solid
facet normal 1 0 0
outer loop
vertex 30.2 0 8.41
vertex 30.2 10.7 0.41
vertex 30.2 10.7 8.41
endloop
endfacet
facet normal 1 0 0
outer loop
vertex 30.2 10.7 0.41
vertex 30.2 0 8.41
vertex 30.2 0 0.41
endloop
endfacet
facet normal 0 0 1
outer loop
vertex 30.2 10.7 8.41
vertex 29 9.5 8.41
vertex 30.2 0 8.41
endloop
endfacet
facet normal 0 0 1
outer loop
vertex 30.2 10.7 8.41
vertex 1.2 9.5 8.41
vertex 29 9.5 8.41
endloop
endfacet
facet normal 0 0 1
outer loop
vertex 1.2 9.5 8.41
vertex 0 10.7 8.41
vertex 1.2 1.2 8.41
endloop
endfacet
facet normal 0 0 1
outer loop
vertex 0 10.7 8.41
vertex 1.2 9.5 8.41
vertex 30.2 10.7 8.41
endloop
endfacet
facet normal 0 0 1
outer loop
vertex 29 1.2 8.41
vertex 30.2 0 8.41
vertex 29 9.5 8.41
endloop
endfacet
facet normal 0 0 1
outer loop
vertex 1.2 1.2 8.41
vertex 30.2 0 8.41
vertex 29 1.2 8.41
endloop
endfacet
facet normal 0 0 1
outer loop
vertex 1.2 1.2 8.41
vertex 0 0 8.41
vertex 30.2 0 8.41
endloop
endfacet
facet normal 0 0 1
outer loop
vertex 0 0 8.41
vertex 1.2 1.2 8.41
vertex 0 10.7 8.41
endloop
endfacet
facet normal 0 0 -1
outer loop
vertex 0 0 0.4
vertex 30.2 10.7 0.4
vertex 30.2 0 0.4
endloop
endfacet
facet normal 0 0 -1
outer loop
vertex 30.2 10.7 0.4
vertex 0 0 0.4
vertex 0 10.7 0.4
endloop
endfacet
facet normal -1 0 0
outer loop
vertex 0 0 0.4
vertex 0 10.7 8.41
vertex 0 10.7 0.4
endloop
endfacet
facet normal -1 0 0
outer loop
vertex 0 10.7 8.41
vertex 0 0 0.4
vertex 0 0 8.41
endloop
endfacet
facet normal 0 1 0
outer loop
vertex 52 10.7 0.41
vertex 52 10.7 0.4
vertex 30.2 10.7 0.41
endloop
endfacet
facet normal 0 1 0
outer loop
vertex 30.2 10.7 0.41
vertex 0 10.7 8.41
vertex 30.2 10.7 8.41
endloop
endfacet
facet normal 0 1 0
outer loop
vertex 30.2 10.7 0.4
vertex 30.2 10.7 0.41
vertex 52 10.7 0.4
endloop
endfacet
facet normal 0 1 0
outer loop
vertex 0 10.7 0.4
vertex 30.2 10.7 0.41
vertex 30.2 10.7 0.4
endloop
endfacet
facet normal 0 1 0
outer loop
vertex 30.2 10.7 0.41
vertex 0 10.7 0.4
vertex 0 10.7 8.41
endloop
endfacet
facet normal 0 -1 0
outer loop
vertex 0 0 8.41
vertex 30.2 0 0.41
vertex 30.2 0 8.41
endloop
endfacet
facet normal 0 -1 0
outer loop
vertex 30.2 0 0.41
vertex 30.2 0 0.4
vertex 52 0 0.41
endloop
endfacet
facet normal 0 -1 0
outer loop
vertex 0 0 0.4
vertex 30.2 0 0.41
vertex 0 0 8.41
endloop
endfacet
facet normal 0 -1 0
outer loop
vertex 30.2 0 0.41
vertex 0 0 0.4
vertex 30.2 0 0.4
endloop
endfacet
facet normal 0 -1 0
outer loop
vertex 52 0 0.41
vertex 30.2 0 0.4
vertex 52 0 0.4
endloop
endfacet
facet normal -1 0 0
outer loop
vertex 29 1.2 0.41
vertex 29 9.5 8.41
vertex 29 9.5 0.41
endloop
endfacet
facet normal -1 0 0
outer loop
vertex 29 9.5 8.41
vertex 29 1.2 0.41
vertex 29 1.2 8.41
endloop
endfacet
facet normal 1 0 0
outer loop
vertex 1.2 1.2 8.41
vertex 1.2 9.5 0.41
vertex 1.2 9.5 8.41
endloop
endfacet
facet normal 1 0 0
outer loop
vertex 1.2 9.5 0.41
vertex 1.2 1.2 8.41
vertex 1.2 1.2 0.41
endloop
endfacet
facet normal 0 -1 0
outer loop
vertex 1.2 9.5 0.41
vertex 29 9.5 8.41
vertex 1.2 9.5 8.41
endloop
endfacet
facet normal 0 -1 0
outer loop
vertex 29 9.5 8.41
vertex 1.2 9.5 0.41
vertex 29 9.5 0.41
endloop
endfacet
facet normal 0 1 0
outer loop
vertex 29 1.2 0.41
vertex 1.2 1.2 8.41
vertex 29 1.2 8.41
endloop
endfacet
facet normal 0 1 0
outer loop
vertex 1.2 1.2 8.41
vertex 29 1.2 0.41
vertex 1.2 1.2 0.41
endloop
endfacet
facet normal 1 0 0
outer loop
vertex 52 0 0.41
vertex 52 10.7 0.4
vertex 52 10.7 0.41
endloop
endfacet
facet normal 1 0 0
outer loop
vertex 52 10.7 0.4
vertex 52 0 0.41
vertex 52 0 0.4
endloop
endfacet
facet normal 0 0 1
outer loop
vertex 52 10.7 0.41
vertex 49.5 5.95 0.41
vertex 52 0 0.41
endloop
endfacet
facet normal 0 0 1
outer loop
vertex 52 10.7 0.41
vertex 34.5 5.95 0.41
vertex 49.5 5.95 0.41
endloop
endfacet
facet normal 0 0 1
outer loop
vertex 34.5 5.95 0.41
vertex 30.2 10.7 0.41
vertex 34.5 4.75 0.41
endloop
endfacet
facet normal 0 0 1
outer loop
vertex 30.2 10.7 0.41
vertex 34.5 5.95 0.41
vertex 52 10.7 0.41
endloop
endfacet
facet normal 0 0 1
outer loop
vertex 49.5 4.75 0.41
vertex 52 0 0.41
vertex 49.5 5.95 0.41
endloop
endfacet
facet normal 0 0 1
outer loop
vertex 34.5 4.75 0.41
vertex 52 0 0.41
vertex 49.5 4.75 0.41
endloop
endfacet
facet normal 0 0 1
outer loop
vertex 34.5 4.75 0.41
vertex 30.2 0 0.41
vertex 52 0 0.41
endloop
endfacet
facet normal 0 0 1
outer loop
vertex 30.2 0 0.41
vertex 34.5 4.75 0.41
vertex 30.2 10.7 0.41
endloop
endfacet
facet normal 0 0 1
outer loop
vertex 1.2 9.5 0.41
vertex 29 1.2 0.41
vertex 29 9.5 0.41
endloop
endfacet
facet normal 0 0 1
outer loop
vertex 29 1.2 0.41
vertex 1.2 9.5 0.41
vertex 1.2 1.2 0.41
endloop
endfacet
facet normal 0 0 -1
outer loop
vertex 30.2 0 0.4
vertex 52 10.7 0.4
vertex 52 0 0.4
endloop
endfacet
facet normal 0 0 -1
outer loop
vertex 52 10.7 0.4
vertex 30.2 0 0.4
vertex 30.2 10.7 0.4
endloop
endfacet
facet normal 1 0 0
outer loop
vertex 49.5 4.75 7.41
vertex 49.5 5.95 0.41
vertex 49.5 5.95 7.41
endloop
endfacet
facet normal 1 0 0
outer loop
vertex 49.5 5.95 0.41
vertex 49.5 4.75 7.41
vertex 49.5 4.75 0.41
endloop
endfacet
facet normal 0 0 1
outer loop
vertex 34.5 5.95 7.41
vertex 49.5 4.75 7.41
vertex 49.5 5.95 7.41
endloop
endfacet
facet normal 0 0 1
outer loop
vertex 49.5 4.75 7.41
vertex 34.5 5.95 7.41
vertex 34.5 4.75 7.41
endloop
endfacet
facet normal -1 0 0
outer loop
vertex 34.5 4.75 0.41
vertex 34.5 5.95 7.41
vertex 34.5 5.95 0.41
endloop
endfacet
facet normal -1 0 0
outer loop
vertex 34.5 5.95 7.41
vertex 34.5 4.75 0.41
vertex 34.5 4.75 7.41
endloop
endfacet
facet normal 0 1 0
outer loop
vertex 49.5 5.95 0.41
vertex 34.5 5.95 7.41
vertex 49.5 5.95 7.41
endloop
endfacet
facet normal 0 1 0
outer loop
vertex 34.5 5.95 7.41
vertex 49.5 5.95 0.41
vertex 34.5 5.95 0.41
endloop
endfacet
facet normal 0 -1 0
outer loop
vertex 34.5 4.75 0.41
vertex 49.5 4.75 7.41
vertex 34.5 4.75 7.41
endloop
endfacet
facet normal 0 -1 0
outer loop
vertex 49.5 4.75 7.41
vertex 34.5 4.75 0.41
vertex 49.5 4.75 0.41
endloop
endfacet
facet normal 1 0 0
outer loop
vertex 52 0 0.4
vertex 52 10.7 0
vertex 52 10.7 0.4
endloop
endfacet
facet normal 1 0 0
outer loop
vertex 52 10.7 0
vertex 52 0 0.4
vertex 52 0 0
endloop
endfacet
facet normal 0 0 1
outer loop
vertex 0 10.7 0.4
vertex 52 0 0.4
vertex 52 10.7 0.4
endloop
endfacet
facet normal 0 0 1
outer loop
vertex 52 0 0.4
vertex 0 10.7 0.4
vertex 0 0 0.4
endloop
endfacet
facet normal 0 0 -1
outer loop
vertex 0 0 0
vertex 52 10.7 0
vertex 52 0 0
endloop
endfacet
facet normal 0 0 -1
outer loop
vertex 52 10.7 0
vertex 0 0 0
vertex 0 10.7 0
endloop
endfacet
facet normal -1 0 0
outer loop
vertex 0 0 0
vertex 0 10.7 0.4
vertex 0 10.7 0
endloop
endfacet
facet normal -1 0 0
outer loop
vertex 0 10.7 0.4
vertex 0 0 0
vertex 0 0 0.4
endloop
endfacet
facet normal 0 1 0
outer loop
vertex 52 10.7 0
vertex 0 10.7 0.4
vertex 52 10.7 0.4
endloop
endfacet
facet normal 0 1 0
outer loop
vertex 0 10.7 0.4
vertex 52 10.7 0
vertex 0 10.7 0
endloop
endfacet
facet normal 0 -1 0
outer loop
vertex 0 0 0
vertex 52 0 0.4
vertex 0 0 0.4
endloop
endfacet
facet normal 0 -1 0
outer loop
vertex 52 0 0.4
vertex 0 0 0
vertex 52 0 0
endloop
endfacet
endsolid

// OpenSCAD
// file: ../../Base/Rotation.scad
// Fischertechnik Box Foundation
// Geometry Helpers Rotation

include <PlacementOptions.scad>

// getRotatedSpace(space, rotation=NoRotation)
// Rotates the space dependent on the specified rotation

function getRotatedSpace(space, rotation=NoRotation) = [
    (rotation == Rotate90 || rotation == Rotate270) ? space.y : space.x,
    (rotation == Rotate90 || rotation == Rotate270) ? space.x : space.y
];

// Rotates the given space around the fixed left lower corner
// space = the space the children needs as width/depth list [width,depth]
// rotation = 0 Rotate0 degrees, 1 Rotate90 degrees, 2 Rotate180 degrees, 3 Rotate270 degrees (equivalent to -90)

module RotateFix(space, rotation=NoRotation) {
    dy = (rotation == Rotate0 || rotation == Rotate270) ? 0 :
        (rotation == Rotate90) ? space.x :
        space.y;
    dx = (rotation < Rotate180) ? 0 :
        (rotation == Rotate180) ? space.x :
        space.y;
    
    translate([dx, dy, 0])
        rotate([0, 0, rotations[rotation]])
            children();
}
// file: ../../Base/Alignment.scad
// Fischertechnik Box Foundation
// Geometry Helpers Alignment

include <PlacementOptions.scad>

// getAlignedX(elementWidth, spaceWidth, align=AlignRight, offset=0)
// Gets the aligned X offset of an element with the given
// width in the given space.
// elementWidth = The width of the element to positon
// spaceWidth = The space where the element should be aligned
// align = 0 AlignLeft, 1 AlignCenter, 2 AlignRight
// offset = an optional offset from the aligned position. When
// aligned left or centered, then positive values are in X direction.
// When aligned right then positive values are in negative X direction.

function getAlignedX(elementWidth, spaceWidth, align=AlignRight, offset=0) =
    (align == AlignLeft) ?
        offset :
        ((align == AlignCenter) ?
        (spaceWidth - elementWidth)/2 + offset :
        spaceWidth - offset - elementWidth);

// getAlignedY(elementDepth, spaceDepth, align=AlignTop, offset=0)
// Gets the aligned Y offset of an element with the given
// depth in the given space.
// elementDepth = The depth of the element to positon
// spaceDepth = The space where the element should be aligned
// align = 0 AlignBottom, 1 AlignCenter, 2 AlignTop
// offset = an optional offset from the aligned position. When
// aligned bottom or centered, then positive values are in Y direction.
// When aligned top then positive values are in negative Y direction.

function getAlignedY(elementDepth, spaceDepth, align=AlignTop, offset=0) =
    (align == AlignBottom) ?
        offset :
        ((align == AlignCenter) ?
        (spaceDepth - elementDepth)/2 + offset :
        spaceDepth - offset - elementDepth);
// file: ../../Base/Boxes.scad
// Fischertechnik Box Foundation
// Pre-designed Boxes

use <Constants.scad>

include <PlacementOptions.scad>

box190Width = 190;
box190Depth = 130;
box130Width = 130;
box130Depth = 95;

// Values are from an original ec3 box
topBottomDifference = 1.5;
outerHeight = 40;
innerHeight = 38.2;
baseThickness = outerHeight - innerHeight;
stackExcess = 5.7;
radius = 3.5;
wallThickness = 1.5;
tolerance = 0.2;
stackOffset = innerHeight - stackExcess;

boxUsageHeight = stackOffset;
boxWallThickness = wallThickness;
boxBaseThickness = baseThickness;
boxWebWidth = 3.0;

// getBoxWallThickness()
// Gets the wall thickness of a Fischertechnik Box
function getBoxWallThickness() = boxWallThickness;

// getBoxUsageHeight()
// Gets the usable height of a Fischertechnik box
function getBoxUsageHeight() = boxUsageHeight;

// getBoxInnerHeight()
// Gets the inner height of a Fischertechnik box, including the stack excess
function getBoxInnerHeight() = innerHeight;

// getBoxBaseThickness()
// Gets the thickness of the Fischertechnik box base.
function getBoxBaseThickness() = boxBaseThickness;

// getBoxWebWidth()
// Gets the width of a box web
function getBoxWebWidth() = boxWebWidth;

// getBox190Space()
// Gets the usable inner space of a Box 190 as an x/y-list
function getBox190Space() = [
    box190Width - 2*getBoxWallThickness() - topBottomDifference, 
    box190Depth - 2*getBoxWallThickness() - topBottomDifference ];

// BoxBase(width, depth)
// Creates an empty stackable Fischertechnik compatible box
// width = Outer width of the box (190, 130, ...)
// depth = Outer depth of the box (130, 95, ...)

module BoxBase(width, depth, height=outerHeight) {    
    thinPlate = 0.01;

    innerHeight = height - baseThickness;    
    
    module BodyPlate(width, depth) {
        translate([radius, radius])
        hull() {
            w = width-2*radius;
            d = depth-2*radius;
            cube([w, d, thinPlate]);
            cylinder(thinPlate, r=radius, $fn=getFragments());
            translate([w, 0])
                cylinder(thinPlate, r=radius, $fn=getFragments());
            translate([w, d])
                cylinder(thinPlate, r=radius, $fn=getFragments());
            translate([0, d])
                cylinder(thinPlate, r=radius, $fn=getFragments());
        }
    }
    
    module Body(tolerance=tolerance) {
        hull() {
            // Bottom with tolerance to fit into the original boxes when stacked
            translate([-wallThickness+tolerance, -wallThickness+tolerance, -baseThickness])
                BodyPlate(width-topBottomDifference-2*tolerance, depth-topBottomDifference-2*tolerance);
            
            // Top
            translate([-wallThickness-topBottomDifference/2, -wallThickness-topBottomDifference/2, innerHeight-thinPlate])
                BodyPlate(width, depth);
         }
    }

    module Cutoff() {
        hull() {
            coWidth = width - 2*wallThickness;
            coDepth = depth - 2*wallThickness;
            
            // Bottom
            BodyPlate(coWidth-topBottomDifference, coDepth-topBottomDifference);

            // Top
            translate([-topBottomDifference/2, -topBottomDifference/2, innerHeight+thinPlate]) 
                BodyPlate(coWidth, coDepth);
        }
    }
    
    difference() {        
        Body();
        Cutoff();
        stackOffset = innerHeight - stackExcess;
        translate([0, 0, stackOffset + baseThickness])
            Body(tolerance=0);
    }
}

// Creates the Fischertechnik empty box 130x190 mm and places it at position 0,0
// 190x130 are the outer sizes, the inner space is slightly smaller. Use getBox190Space() to get the inner sizes.
// The box is positioned that the usable inner space is at the 0,0,0 position. The

module Box190() {
    BoxBase(box190Width, box190Depth);
}

// Gets the usable inner space of a Box 130 as an x/y-list
function getBox130Space() = [
    box130Width - 2*getBoxWallThickness() - topBottomDifference, 
    box130Depth - 2*getBoxWallThickness() - topBottomDifference ];

// Creates the Fischertechnik empty box 95x130 mm and places it at position 0,0
// 190x130 are the outer sizes, the inner space is slightly smaller. Use getBox190Space() to get the inner sizes.
// The box is positioned that the usable inner space is at the 0,0,0 position. The

module Box130() {
    BoxBase(box130Width, box130Depth);
}

// Creates a web at the specified box walls
// corner 0 = LowerLeft, 1 = UpperLeft, 2 = UpperRight, 3 = LowerRight
// side 0 = LeftOfCorner, 1 = RightOfCorner
// distance = Distance in mm from the corner
// boxSpace = inner width and depth of the box (default: Box 190)
// webWidth = length of the web (default is 3 mms)
// webThickness = thickness of the web (default is 1 mm)

module BoxWeb(corner, side, distance, boxSpace=getBox190Space(), webWidth=getBoxWebWidth(), webThickness=1.0) {
    sink = getBoxWallThickness()/2;

    width = (corner % 2 == 0) ? 
            (side == LeftOfCorner ? webWidth : webThickness) :
            (side == LeftOfCorner ? webThickness : webWidth);

    depth = (corner % 2 == 0) ? 
            (side == RightOfCorner ? webWidth : webThickness) :
            (side == RightOfCorner ? webThickness : webWidth);
    
    xDiff = corner == LowerLeft ? 
                (side == LeftOfCorner ? -sink : distance) :
            (corner == UpperLeft ?                
                (side == LeftOfCorner ? distance : -sink) :
            (corner == UpperRight ?
                (side == LeftOfCorner ? boxSpace.x-webWidth+sink : boxSpace.x-distance-webThickness) :
                (side == LeftOfCorner ? boxSpace.x-distance-webThickness: boxSpace.x-webWidth+sink)));

    yDiff = corner == LowerLeft ? 
                (side == RightOfCorner ? -sink : distance) :
            (corner == UpperLeft ?
                (side == RightOfCorner ? boxSpace.y-distance : boxSpace.y-webWidth+sink) :
            (corner == UpperRight ?
                (side == RightOfCorner ? boxSpace.y-webWidth+sink : boxSpace.y-distance) :
                (side == RightOfCorner ? distance : -sink)));
    
    translate([xDiff, yDiff, -getExcess()])
        cube([width, depth, boxUsageHeight + 2*getExcess()]);
}
// file: ../../Base/PlacementOptions.scad
// Fischertechnik Box Foundation
// Placement Options

// Alignment
NoAlign = 0;
AlignLeft = 1;
AlignBottom = 2;
AlignCenter = 3;
AlignRight = 4;
AlignTop = 5;

// Element rotation degree steps
rotations = [0, -90, -180, -270];

// Rotation
NoRotation = 0;
Rotate0 = 0;
Rotate90 = 1;
Rotate180 = 2;
Rotate270 = 3;

// Docking (seen from above)
NoDock = -1;
DockLeft = 0;
DockTop = 1;
DockRight = 2;
DockCorner = 2;
DockBottom = 3;

// Web corners
LowerLeft = 0;
UpperLeft = 1;
UpperRight = 2;
LowerRight = 3;

// Web position relative to corner
LeftOfCorner = 0;
RightOfCorner = 1;
// file: ../../Base/Placement.scad
// Fischertechnik Box Foundation
// Geometry Helpers Placement

use <Constants.scad>
use <Alignment.scad>
use <Rotation.scad>
use <Boxes.scad>

include <PlacementOptions.scad>

// Place(x=0, y=0, elementSpace=[0,0], alignX=AlignLeft, alignY=AlignBottom, rotation=Rotate0, boxSpace=getBox190Space())
// Places the child at the specified position
// y = Y-Position. This is a relative position when an X aligment is specified.
// x = X-Position. This is a relative position when an Y aligment is specified.
// elementSpace = space of the element to be placed [x,y]
// alignX = -1=NoAlign, 0 AlignLeft, 1 AlignCenter, 3 AlignRight (elementSpace and boxSpace required!)
// alignY = -1=NoAlign, 2 AlignBottom, 1 AlignCenter, 4 AlignTop (elementSpace and boxSpace required!)
// rotation = 0 Rotate0 0 degrees, 1 Rotate90 90 degrees, 
// 2 Rotate180 180 degrees, 3 Rotate270 270 degrees (equivalent to -90)
// boxSpace = Inner space of the box where the placement occurs [x,y] - default is Box 190x130 inner space

module Place(x=0, y=0, elementSpace=[0,0], 
  alignX=AlignLeft, alignY=AlignBottom, 
  rotation=NoRotation, boxSpace=getBox190Space()) {

    module Position(x, y, space, rotation=Rotate0) {
        translate([x, y, 0])
            RotateFix(space, rotation)
                children();
    }

    space = getRotatedSpace(elementSpace, rotation);
    alignedX = getAlignedX(space.x, boxSpace.x, alignX, x);
    alignedY = getAlignedY(space.y, boxSpace.y, alignY, y);
    Position(alignedX, alignedY, elementSpace, rotation)
        children();
}

// Center(space=getBox130Space(), elementSpace=[0,0])
// space = Space where the children is centered. For cylinder use centered=true and no elementSpace.
// elementSpace = space of the element to be centered [x,y]

module Center(space=getBox190Space(), elementSpace=[0,0]) {
    Place(elementSpace=elementSpace, boxSpace=space, alignX=AlignCenter, alignY=AlignCenter)
        children();
}

// CenterHorizontal(width=0, y=0, offset=0, space=getBox130Space())
// width = Width of the element to be placed.
// y = Y position of the element
// offset = Offset from the center position (negative will be left of the center)
// space = Space where the element is placed

module CenterHorizontal(width=0, y=0, offset=0, space=getBox190Space()) {
    Place(x=offset, y=y, elementSpace=[width, 0], boxSpace=space, alignX=AlignCenter)
        children(0);
}

// CenterVertical(depth=0, x=0, offset=0, space=getBox130Space())
// depth = Depth of the element to be placed.
// x = X position of the element
// offset = Offset from the center position (negative will be down of the center)
// space = Space where the element is placed

module CenterVertical(depth=0, x=0, offset=0, space=getBox190Space()) {
    Place(x=x, y=offset, elementSpace=[0, depth], boxSpace=space, alignY=AlignCenter)
        children(0);
}

// getIsVertical(align)
// True if the specified alignment needs a vertical orientation for a divider (AlignRight, AlignLeft)

function getIsVertical(align) = (align == AlignRight || align == AlignLeft);

// getIsHorizontal(align)
// True if the specified alignment needs a horizontal orientation for a divider (AlignTop, AlignBottom)

function getIsHorizontal(align) = (align == AlignTop || align == AlignBottom);
// file: ../../Elements/AxisClip10.scad
// Fischertechnik Box Library
// Axis for clip 10
// 31023

use <../ModelBase/Simple.scad>
use <../Base/Constants.scad>

width = 12;
depth = 12;
height = 23;
upperDiameter = 3.6;
clipHeight = 10;

// getAxisClip10Space()
// Gets the space of a frame for a clip 10 with spring ring (mot2)

function getAxisClip10Space() = [width, depth, height];

// AxisClip10(height, clipHeight)
// Axis for clip 10 with spring ring (mot2)
// height = Height of the complete axis
// clipHeight = Height of the rt for the clip (standard is 10, in mot3 its only 7)

module AxisClip10(height=height, clipHeight=clipHeight) {
    LeveledAxisWithSpace(height, height-clipHeight, getAxisClip10Space(), diameter=upperDiameter);
}

// Tests
color("lightgray")
AxisClip10();
// file: ../../Base/Constants.scad
// Fischertechnik Box Foundation
// Constants

// Constant values necessary for multiple elements

// Base constants
dividerThickness = 1.2;
excess = 0.01;
fragments = 90;
tolerance = 0.8;

// Gets the thickness of a divider 
function getDividerThickness() = dividerThickness;

// Gets the excess that is used to merge walls into each other
function getExcess() = excess;

// Gets amount of fragments of a cylinder
function getFragments() = fragments;

// Gets the inner tolerance of a frame to each side
function getTolerance() = tolerance;


// Fischertechnik specific constants
axisDiameter = 4;
axisBottomDiameter = axisDiameter + 1;
standardEdgeDistance = 2.5;
standardWebDistance = 11.5;
standardCornerLength = 15;
tubeWallFactor = 0.8;
smallPartsFrameHeight = 20;

// Gets axis diameter
function getAxisDiameter() = axisDiameter;

// Gets axis bottom diameter for thicker part at the bottom
function getAxisBottomDiameter() = axisBottomDiameter;

// gets the standard distance to the wall of the box for dockable frames with webs
function getStandardEdgeDistance() = standardEdgeDistance;

// gets the standard distance of each web to the corner of the dockable frame
function getStandardWebDistance() = standardWebDistance;

// gets the standard length of the corner walls of a dockable frame
function getStandardCornerLength() = standardCornerLength;

// gets the wall thickness of a tube.
function getTubeWallThickness() = tubeWallFactor * getDividerThickness();

// gets the frame height for docked small parts boxes.
function getSmallPartsFrameHeight() = smallPartsFrameHeight;
// file: ../../Elements/FrameBracketWithWorm.scad
// Fischertechnik Box Library
// Frame  for bracket with worm
// 31045

use <../Base/Constants.scad>
use <../ModelBase/Complex.scad>

// getFrameBracketWithWormSpace()
// Gets the space for a frame for a bracket with worm.

function getFrameBracketWithWormSpace() = getFrameBracketSpace();

// FrameBracketWithWorm()
// Frame for bracket with worm.

module FrameBracketWithWorm() {
    FrameBracket([ 15, getDividerThickness(), 7 ]);
}

// Test
color("lightgray")
FrameBracketWithWorm();
// file: ../TestPrint.scad
// 3D Print Test Base

use <../Base/Constants.scad>

use <../Elements/AxisClip10.scad>

module TestPrint(elementSpace) {
    cube([elementSpace.x, elementSpace.y, 0.4]);
    translate([0,0,0.4+getExcess()]) {
        children();
    }
}

TestPrint(getAxisClip10Space())
    AxisClip10();
// main file
// 3D Print Test
// FrameBracketWithWorm

use <../TestPrint.scad>
use <../../Elements/FrameBracketWithWorm.scad>

TestPrint(getFrameBracketWithWormSpace())
    FrameBracketWithWorm();
